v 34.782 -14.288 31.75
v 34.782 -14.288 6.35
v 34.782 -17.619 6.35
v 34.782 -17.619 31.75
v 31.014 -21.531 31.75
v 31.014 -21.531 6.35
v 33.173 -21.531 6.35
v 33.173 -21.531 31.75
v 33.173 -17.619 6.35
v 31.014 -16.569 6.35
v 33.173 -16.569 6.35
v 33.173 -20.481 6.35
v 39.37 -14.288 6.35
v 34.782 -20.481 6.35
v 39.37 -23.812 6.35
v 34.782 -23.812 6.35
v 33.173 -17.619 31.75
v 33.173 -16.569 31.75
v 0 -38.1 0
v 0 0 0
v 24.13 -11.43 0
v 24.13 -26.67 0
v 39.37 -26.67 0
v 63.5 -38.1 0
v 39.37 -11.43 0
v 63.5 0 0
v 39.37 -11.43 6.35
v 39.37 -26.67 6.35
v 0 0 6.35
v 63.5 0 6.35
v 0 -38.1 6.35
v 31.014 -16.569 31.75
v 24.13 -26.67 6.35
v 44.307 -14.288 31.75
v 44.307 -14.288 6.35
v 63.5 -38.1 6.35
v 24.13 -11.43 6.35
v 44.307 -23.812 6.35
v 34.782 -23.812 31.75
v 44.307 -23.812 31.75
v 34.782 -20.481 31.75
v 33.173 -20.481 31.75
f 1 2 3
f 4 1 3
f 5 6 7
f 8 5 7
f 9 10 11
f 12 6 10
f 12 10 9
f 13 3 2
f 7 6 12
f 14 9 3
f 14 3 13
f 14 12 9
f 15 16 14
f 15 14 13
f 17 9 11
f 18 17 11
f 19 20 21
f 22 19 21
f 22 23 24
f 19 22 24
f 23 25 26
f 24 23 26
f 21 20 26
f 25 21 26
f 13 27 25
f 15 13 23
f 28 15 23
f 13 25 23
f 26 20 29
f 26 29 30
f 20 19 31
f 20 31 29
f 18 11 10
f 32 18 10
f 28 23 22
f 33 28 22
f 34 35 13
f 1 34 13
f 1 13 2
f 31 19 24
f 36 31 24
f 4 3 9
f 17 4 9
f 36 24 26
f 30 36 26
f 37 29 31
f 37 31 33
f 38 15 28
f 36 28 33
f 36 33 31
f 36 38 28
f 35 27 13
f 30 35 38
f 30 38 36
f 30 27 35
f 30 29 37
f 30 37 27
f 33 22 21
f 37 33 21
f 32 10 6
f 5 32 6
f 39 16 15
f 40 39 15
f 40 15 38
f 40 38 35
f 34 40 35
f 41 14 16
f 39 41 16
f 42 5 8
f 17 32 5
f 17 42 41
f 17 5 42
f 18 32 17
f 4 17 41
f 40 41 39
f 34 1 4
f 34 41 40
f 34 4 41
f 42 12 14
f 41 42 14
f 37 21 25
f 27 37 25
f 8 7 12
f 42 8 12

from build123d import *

# Parameters (mm, degrees)
F0_W     = 63.5
F0_H     = 38.1
F1_DEPTH = 6.35
F2_W     = 0.7357047051
F2_H     = 2.4810375154
F3_DEPTH = 25.4
F4_W     = 7.62
F4_H     = 7.62
F5_DEPTH = 6.35


with BuildPart() as f1:
    # F0 (on Top) → F1 (new body)
    with BuildSketch(Plane.XY):
        with Locations((31.75, -19.05)):
            Rectangle(F0_W, F0_H)
    extrude(amount=F1_DEPTH)

    # F2 (on face) → F3 (join)
    with BuildSketch(Plane.XY.offset(6.35)):
        with Locations((31.3821476474, -17.8094812423)):
            Rectangle(F2_W, F2_H)
        Polygon((33.1730134785, -16.5689624846), (31.75, -16.5689624846), (31.75, -19.05), (44.3069849849, -19.05), (44.3069849849, -14.2875), (34.7819849849, -14.2875), (34.7819849849, -17.6186021417), (33.1730134785, -17.6186021417), align=None)
        with Locations((31.3821476474, -20.2905187577)):
            Rectangle(F2_W, F2_H)
        Polygon((44.3069849849, -19.05), (31.75, -19.05), (31.75, -21.5310375154), (33.1730134785, -21.5310375154), (33.1730134785, -20.4813978583), (34.7819849849, -20.4813978583), (34.7819849849, -23.8125), (44.3069849849, -23.8125), align=None)
    extrude(amount=F3_DEPTH)

    # F4 (on face) → F5 (cut)
    with BuildSketch(Plane(origin=(0, 0, 0), x_dir=(1, 0, 0), z_dir=(0, 0, -1))):
        with Locations((27.94, 15.24)):
            Rectangle(F4_W, F4_H)
        with Locations((35.56, 15.24)):
            Rectangle(F4_W, F4_H)
        with Locations((35.56, 22.86)):
            Rectangle(F4_W, F4_H)
        with Locations((27.94, 22.86)):
            Rectangle(F4_W, F4_H)
    extrude(amount=-F5_DEPTH, mode=Mode.SUBTRACT)


solid = f1.part
